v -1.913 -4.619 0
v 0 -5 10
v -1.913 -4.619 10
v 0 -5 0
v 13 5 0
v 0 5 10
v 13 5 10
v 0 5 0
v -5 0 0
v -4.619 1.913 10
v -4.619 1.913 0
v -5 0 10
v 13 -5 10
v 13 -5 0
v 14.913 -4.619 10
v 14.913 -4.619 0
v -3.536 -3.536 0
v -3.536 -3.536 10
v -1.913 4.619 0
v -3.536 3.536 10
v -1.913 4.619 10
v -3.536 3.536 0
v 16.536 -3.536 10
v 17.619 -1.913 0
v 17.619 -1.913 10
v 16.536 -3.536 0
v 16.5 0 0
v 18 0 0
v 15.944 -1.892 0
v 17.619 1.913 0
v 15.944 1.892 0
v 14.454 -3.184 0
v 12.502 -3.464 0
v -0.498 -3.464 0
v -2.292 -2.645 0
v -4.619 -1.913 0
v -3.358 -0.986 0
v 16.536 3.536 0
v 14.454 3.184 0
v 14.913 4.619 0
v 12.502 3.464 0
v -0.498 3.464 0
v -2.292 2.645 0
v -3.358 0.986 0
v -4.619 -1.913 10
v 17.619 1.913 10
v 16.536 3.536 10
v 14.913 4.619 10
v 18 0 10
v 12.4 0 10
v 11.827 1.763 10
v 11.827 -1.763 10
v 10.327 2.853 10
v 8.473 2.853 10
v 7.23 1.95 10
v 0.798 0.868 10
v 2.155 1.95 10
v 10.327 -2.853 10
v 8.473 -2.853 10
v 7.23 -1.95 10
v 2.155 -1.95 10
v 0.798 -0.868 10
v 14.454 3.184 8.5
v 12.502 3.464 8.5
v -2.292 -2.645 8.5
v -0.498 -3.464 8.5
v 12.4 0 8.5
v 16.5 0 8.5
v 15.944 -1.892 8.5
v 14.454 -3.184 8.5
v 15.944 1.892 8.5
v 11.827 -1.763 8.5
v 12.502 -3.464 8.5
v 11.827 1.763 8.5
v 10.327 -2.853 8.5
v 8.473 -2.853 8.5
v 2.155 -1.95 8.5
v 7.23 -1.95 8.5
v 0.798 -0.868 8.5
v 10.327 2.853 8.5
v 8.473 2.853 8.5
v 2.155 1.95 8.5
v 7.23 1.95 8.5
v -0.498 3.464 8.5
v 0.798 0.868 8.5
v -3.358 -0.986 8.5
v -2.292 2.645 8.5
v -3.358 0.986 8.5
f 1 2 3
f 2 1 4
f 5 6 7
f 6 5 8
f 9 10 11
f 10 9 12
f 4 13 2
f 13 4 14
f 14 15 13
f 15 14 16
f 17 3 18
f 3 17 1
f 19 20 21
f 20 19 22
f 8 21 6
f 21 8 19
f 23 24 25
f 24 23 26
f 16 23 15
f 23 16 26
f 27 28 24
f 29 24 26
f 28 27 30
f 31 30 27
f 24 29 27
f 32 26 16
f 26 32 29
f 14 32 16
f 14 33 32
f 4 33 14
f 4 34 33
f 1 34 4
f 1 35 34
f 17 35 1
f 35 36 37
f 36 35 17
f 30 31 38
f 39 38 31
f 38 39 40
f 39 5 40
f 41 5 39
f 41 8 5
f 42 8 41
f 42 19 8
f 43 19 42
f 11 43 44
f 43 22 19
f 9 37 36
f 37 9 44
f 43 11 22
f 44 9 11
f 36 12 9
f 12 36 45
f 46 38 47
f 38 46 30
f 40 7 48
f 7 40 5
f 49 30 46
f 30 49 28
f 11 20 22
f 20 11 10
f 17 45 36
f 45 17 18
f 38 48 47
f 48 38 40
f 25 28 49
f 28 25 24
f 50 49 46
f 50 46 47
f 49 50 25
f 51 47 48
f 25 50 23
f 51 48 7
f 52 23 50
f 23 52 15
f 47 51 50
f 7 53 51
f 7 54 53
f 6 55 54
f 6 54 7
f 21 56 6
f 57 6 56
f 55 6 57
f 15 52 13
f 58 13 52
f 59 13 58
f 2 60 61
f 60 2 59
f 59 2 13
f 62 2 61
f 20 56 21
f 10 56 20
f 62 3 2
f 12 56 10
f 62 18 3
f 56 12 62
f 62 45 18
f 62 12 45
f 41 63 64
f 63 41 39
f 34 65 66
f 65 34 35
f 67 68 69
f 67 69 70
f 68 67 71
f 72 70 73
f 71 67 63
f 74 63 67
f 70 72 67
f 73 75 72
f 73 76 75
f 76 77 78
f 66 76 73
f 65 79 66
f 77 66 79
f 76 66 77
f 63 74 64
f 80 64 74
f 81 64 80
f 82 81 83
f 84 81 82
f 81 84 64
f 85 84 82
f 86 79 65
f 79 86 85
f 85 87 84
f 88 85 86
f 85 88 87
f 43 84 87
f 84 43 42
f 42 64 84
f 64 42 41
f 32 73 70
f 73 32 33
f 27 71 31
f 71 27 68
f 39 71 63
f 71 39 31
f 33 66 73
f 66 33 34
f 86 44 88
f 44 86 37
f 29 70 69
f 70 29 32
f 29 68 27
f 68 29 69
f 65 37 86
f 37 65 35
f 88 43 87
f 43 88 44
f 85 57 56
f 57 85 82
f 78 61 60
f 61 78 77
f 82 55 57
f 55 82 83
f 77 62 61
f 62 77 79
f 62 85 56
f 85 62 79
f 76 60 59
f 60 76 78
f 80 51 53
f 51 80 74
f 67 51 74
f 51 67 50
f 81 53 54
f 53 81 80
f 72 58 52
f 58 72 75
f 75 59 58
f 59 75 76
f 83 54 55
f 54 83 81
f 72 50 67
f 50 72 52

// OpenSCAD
// Diameter of the hanger
diameter = 10.0;
// Distance of the two circle centers
distance = 13.0;
// Depth of the hole 
depth=10;
// Wall thickness of the hanger
wall=1.5;
// Diameter of the shaft of the screw
screwshaft=4;
// Diameter of the head of the screw
screwhead=6;
// Depth of the groves at the sides (0=max, 1=no groves)
shiftout = 0.2; //[0:0.05:1]

hanger(diameter=diameter, depth=depth, wall=wall, screwshaft=screwshaft, screwhead=screwhead, shiftout=shiftout, distance=distance);

module hanger(  diameter = 20.2,
                   depth=10,
                   wall=4,
                   screwshaft=4,
                   screwhead=9,
                   shiftout = 0.2,
                   distance = 13.0
                   ) {

    difference() {
            
        difference() {
            // Exterior shell
            difference() {

                hull() {
                    cylinder(r=diameter/2, h=depth);
                    translate([distance,0,0]) cylinder(r=diameter/2, h=depth);
                }
                
                hull() {
                    cylinder(r=(diameter/2)-wall, h=depth-wall);
                    translate([distance,0,0]) cylinder(r=(diameter/2)-wall, h=depth-wall);
                }
            }

            // Slot
            translate([0.5*distance,0,0]) {
                keyhole(width=screwshaft, length=0.6*distance, height=depth*3, width2=screwhead);
            }
            
        }

        //slots(depth=wall/2, radius=diameter/2, height=depth, shiftout=shiftout);

    }

}

module keyhole(width, length, height, width2) {
    shift=((width2-width)/2);
    union() {
        roundrect(width, length, height);
        translate([(length/2)-shift,0,0])
            cylinder(r=width2/2, h=height);
    }
}

module roundrect(width, length, height) {
  hull() {
      translate([-length/2,0,0])
        cylinder(r=width/2, h=height);
      translate([length/2,0,0])
        cylinder(r=width/2, h=height);
  }  
}

module slots(depth, radius, height, shiftout) {
    union() {
    for(z=[height-2*depth:-depth:0-depth]) {
        echo(z);
        translate([0,0,z])
        rotate_extrude(convexity=10)
          translate([radius+shiftout*depth,0,0])
          rotate(45)
          square(0.5*sqrt(2*depth*depth));
        
    }
}
}
